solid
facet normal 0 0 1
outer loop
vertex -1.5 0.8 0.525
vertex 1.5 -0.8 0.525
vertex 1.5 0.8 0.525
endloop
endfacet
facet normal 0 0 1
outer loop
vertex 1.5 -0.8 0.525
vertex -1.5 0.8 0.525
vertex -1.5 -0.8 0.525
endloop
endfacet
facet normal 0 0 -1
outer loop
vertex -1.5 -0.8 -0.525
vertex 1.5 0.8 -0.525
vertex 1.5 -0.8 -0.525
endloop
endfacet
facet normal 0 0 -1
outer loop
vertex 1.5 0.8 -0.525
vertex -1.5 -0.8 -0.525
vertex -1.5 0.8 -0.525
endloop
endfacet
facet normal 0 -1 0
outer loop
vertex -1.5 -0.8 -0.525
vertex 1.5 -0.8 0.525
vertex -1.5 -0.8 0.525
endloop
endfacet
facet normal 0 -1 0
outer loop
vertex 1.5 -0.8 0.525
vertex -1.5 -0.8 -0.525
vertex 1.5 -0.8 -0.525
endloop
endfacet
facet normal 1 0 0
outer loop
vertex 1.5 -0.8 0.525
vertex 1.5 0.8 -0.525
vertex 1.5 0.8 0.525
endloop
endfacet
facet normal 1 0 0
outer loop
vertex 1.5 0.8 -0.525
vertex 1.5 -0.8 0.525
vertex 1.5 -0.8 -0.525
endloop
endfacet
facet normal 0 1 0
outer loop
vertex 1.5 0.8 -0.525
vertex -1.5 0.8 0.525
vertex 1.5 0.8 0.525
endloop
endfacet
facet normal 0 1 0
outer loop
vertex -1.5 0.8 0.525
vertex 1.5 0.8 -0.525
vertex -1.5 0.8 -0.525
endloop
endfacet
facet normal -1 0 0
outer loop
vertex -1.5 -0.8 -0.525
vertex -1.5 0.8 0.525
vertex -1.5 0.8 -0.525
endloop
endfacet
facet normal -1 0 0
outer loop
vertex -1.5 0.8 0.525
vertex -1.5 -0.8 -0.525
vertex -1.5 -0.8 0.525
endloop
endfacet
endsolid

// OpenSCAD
// Parameters
body_length = 3.0; //[1.5:6.0:0.05]
body_width = 1.6; //[0.8:3.2:0.05]
body_height = 1.05; //[0.5:2.1:0.05]

// Geometry
module smd_body() {
  color([0.85, 0.85, 0.8]) // Off-white for SMD component
  translate([0, 0, 0])
    cube([body_length, body_width, body_height], center=true);
}

// Final Output
smd_body();
